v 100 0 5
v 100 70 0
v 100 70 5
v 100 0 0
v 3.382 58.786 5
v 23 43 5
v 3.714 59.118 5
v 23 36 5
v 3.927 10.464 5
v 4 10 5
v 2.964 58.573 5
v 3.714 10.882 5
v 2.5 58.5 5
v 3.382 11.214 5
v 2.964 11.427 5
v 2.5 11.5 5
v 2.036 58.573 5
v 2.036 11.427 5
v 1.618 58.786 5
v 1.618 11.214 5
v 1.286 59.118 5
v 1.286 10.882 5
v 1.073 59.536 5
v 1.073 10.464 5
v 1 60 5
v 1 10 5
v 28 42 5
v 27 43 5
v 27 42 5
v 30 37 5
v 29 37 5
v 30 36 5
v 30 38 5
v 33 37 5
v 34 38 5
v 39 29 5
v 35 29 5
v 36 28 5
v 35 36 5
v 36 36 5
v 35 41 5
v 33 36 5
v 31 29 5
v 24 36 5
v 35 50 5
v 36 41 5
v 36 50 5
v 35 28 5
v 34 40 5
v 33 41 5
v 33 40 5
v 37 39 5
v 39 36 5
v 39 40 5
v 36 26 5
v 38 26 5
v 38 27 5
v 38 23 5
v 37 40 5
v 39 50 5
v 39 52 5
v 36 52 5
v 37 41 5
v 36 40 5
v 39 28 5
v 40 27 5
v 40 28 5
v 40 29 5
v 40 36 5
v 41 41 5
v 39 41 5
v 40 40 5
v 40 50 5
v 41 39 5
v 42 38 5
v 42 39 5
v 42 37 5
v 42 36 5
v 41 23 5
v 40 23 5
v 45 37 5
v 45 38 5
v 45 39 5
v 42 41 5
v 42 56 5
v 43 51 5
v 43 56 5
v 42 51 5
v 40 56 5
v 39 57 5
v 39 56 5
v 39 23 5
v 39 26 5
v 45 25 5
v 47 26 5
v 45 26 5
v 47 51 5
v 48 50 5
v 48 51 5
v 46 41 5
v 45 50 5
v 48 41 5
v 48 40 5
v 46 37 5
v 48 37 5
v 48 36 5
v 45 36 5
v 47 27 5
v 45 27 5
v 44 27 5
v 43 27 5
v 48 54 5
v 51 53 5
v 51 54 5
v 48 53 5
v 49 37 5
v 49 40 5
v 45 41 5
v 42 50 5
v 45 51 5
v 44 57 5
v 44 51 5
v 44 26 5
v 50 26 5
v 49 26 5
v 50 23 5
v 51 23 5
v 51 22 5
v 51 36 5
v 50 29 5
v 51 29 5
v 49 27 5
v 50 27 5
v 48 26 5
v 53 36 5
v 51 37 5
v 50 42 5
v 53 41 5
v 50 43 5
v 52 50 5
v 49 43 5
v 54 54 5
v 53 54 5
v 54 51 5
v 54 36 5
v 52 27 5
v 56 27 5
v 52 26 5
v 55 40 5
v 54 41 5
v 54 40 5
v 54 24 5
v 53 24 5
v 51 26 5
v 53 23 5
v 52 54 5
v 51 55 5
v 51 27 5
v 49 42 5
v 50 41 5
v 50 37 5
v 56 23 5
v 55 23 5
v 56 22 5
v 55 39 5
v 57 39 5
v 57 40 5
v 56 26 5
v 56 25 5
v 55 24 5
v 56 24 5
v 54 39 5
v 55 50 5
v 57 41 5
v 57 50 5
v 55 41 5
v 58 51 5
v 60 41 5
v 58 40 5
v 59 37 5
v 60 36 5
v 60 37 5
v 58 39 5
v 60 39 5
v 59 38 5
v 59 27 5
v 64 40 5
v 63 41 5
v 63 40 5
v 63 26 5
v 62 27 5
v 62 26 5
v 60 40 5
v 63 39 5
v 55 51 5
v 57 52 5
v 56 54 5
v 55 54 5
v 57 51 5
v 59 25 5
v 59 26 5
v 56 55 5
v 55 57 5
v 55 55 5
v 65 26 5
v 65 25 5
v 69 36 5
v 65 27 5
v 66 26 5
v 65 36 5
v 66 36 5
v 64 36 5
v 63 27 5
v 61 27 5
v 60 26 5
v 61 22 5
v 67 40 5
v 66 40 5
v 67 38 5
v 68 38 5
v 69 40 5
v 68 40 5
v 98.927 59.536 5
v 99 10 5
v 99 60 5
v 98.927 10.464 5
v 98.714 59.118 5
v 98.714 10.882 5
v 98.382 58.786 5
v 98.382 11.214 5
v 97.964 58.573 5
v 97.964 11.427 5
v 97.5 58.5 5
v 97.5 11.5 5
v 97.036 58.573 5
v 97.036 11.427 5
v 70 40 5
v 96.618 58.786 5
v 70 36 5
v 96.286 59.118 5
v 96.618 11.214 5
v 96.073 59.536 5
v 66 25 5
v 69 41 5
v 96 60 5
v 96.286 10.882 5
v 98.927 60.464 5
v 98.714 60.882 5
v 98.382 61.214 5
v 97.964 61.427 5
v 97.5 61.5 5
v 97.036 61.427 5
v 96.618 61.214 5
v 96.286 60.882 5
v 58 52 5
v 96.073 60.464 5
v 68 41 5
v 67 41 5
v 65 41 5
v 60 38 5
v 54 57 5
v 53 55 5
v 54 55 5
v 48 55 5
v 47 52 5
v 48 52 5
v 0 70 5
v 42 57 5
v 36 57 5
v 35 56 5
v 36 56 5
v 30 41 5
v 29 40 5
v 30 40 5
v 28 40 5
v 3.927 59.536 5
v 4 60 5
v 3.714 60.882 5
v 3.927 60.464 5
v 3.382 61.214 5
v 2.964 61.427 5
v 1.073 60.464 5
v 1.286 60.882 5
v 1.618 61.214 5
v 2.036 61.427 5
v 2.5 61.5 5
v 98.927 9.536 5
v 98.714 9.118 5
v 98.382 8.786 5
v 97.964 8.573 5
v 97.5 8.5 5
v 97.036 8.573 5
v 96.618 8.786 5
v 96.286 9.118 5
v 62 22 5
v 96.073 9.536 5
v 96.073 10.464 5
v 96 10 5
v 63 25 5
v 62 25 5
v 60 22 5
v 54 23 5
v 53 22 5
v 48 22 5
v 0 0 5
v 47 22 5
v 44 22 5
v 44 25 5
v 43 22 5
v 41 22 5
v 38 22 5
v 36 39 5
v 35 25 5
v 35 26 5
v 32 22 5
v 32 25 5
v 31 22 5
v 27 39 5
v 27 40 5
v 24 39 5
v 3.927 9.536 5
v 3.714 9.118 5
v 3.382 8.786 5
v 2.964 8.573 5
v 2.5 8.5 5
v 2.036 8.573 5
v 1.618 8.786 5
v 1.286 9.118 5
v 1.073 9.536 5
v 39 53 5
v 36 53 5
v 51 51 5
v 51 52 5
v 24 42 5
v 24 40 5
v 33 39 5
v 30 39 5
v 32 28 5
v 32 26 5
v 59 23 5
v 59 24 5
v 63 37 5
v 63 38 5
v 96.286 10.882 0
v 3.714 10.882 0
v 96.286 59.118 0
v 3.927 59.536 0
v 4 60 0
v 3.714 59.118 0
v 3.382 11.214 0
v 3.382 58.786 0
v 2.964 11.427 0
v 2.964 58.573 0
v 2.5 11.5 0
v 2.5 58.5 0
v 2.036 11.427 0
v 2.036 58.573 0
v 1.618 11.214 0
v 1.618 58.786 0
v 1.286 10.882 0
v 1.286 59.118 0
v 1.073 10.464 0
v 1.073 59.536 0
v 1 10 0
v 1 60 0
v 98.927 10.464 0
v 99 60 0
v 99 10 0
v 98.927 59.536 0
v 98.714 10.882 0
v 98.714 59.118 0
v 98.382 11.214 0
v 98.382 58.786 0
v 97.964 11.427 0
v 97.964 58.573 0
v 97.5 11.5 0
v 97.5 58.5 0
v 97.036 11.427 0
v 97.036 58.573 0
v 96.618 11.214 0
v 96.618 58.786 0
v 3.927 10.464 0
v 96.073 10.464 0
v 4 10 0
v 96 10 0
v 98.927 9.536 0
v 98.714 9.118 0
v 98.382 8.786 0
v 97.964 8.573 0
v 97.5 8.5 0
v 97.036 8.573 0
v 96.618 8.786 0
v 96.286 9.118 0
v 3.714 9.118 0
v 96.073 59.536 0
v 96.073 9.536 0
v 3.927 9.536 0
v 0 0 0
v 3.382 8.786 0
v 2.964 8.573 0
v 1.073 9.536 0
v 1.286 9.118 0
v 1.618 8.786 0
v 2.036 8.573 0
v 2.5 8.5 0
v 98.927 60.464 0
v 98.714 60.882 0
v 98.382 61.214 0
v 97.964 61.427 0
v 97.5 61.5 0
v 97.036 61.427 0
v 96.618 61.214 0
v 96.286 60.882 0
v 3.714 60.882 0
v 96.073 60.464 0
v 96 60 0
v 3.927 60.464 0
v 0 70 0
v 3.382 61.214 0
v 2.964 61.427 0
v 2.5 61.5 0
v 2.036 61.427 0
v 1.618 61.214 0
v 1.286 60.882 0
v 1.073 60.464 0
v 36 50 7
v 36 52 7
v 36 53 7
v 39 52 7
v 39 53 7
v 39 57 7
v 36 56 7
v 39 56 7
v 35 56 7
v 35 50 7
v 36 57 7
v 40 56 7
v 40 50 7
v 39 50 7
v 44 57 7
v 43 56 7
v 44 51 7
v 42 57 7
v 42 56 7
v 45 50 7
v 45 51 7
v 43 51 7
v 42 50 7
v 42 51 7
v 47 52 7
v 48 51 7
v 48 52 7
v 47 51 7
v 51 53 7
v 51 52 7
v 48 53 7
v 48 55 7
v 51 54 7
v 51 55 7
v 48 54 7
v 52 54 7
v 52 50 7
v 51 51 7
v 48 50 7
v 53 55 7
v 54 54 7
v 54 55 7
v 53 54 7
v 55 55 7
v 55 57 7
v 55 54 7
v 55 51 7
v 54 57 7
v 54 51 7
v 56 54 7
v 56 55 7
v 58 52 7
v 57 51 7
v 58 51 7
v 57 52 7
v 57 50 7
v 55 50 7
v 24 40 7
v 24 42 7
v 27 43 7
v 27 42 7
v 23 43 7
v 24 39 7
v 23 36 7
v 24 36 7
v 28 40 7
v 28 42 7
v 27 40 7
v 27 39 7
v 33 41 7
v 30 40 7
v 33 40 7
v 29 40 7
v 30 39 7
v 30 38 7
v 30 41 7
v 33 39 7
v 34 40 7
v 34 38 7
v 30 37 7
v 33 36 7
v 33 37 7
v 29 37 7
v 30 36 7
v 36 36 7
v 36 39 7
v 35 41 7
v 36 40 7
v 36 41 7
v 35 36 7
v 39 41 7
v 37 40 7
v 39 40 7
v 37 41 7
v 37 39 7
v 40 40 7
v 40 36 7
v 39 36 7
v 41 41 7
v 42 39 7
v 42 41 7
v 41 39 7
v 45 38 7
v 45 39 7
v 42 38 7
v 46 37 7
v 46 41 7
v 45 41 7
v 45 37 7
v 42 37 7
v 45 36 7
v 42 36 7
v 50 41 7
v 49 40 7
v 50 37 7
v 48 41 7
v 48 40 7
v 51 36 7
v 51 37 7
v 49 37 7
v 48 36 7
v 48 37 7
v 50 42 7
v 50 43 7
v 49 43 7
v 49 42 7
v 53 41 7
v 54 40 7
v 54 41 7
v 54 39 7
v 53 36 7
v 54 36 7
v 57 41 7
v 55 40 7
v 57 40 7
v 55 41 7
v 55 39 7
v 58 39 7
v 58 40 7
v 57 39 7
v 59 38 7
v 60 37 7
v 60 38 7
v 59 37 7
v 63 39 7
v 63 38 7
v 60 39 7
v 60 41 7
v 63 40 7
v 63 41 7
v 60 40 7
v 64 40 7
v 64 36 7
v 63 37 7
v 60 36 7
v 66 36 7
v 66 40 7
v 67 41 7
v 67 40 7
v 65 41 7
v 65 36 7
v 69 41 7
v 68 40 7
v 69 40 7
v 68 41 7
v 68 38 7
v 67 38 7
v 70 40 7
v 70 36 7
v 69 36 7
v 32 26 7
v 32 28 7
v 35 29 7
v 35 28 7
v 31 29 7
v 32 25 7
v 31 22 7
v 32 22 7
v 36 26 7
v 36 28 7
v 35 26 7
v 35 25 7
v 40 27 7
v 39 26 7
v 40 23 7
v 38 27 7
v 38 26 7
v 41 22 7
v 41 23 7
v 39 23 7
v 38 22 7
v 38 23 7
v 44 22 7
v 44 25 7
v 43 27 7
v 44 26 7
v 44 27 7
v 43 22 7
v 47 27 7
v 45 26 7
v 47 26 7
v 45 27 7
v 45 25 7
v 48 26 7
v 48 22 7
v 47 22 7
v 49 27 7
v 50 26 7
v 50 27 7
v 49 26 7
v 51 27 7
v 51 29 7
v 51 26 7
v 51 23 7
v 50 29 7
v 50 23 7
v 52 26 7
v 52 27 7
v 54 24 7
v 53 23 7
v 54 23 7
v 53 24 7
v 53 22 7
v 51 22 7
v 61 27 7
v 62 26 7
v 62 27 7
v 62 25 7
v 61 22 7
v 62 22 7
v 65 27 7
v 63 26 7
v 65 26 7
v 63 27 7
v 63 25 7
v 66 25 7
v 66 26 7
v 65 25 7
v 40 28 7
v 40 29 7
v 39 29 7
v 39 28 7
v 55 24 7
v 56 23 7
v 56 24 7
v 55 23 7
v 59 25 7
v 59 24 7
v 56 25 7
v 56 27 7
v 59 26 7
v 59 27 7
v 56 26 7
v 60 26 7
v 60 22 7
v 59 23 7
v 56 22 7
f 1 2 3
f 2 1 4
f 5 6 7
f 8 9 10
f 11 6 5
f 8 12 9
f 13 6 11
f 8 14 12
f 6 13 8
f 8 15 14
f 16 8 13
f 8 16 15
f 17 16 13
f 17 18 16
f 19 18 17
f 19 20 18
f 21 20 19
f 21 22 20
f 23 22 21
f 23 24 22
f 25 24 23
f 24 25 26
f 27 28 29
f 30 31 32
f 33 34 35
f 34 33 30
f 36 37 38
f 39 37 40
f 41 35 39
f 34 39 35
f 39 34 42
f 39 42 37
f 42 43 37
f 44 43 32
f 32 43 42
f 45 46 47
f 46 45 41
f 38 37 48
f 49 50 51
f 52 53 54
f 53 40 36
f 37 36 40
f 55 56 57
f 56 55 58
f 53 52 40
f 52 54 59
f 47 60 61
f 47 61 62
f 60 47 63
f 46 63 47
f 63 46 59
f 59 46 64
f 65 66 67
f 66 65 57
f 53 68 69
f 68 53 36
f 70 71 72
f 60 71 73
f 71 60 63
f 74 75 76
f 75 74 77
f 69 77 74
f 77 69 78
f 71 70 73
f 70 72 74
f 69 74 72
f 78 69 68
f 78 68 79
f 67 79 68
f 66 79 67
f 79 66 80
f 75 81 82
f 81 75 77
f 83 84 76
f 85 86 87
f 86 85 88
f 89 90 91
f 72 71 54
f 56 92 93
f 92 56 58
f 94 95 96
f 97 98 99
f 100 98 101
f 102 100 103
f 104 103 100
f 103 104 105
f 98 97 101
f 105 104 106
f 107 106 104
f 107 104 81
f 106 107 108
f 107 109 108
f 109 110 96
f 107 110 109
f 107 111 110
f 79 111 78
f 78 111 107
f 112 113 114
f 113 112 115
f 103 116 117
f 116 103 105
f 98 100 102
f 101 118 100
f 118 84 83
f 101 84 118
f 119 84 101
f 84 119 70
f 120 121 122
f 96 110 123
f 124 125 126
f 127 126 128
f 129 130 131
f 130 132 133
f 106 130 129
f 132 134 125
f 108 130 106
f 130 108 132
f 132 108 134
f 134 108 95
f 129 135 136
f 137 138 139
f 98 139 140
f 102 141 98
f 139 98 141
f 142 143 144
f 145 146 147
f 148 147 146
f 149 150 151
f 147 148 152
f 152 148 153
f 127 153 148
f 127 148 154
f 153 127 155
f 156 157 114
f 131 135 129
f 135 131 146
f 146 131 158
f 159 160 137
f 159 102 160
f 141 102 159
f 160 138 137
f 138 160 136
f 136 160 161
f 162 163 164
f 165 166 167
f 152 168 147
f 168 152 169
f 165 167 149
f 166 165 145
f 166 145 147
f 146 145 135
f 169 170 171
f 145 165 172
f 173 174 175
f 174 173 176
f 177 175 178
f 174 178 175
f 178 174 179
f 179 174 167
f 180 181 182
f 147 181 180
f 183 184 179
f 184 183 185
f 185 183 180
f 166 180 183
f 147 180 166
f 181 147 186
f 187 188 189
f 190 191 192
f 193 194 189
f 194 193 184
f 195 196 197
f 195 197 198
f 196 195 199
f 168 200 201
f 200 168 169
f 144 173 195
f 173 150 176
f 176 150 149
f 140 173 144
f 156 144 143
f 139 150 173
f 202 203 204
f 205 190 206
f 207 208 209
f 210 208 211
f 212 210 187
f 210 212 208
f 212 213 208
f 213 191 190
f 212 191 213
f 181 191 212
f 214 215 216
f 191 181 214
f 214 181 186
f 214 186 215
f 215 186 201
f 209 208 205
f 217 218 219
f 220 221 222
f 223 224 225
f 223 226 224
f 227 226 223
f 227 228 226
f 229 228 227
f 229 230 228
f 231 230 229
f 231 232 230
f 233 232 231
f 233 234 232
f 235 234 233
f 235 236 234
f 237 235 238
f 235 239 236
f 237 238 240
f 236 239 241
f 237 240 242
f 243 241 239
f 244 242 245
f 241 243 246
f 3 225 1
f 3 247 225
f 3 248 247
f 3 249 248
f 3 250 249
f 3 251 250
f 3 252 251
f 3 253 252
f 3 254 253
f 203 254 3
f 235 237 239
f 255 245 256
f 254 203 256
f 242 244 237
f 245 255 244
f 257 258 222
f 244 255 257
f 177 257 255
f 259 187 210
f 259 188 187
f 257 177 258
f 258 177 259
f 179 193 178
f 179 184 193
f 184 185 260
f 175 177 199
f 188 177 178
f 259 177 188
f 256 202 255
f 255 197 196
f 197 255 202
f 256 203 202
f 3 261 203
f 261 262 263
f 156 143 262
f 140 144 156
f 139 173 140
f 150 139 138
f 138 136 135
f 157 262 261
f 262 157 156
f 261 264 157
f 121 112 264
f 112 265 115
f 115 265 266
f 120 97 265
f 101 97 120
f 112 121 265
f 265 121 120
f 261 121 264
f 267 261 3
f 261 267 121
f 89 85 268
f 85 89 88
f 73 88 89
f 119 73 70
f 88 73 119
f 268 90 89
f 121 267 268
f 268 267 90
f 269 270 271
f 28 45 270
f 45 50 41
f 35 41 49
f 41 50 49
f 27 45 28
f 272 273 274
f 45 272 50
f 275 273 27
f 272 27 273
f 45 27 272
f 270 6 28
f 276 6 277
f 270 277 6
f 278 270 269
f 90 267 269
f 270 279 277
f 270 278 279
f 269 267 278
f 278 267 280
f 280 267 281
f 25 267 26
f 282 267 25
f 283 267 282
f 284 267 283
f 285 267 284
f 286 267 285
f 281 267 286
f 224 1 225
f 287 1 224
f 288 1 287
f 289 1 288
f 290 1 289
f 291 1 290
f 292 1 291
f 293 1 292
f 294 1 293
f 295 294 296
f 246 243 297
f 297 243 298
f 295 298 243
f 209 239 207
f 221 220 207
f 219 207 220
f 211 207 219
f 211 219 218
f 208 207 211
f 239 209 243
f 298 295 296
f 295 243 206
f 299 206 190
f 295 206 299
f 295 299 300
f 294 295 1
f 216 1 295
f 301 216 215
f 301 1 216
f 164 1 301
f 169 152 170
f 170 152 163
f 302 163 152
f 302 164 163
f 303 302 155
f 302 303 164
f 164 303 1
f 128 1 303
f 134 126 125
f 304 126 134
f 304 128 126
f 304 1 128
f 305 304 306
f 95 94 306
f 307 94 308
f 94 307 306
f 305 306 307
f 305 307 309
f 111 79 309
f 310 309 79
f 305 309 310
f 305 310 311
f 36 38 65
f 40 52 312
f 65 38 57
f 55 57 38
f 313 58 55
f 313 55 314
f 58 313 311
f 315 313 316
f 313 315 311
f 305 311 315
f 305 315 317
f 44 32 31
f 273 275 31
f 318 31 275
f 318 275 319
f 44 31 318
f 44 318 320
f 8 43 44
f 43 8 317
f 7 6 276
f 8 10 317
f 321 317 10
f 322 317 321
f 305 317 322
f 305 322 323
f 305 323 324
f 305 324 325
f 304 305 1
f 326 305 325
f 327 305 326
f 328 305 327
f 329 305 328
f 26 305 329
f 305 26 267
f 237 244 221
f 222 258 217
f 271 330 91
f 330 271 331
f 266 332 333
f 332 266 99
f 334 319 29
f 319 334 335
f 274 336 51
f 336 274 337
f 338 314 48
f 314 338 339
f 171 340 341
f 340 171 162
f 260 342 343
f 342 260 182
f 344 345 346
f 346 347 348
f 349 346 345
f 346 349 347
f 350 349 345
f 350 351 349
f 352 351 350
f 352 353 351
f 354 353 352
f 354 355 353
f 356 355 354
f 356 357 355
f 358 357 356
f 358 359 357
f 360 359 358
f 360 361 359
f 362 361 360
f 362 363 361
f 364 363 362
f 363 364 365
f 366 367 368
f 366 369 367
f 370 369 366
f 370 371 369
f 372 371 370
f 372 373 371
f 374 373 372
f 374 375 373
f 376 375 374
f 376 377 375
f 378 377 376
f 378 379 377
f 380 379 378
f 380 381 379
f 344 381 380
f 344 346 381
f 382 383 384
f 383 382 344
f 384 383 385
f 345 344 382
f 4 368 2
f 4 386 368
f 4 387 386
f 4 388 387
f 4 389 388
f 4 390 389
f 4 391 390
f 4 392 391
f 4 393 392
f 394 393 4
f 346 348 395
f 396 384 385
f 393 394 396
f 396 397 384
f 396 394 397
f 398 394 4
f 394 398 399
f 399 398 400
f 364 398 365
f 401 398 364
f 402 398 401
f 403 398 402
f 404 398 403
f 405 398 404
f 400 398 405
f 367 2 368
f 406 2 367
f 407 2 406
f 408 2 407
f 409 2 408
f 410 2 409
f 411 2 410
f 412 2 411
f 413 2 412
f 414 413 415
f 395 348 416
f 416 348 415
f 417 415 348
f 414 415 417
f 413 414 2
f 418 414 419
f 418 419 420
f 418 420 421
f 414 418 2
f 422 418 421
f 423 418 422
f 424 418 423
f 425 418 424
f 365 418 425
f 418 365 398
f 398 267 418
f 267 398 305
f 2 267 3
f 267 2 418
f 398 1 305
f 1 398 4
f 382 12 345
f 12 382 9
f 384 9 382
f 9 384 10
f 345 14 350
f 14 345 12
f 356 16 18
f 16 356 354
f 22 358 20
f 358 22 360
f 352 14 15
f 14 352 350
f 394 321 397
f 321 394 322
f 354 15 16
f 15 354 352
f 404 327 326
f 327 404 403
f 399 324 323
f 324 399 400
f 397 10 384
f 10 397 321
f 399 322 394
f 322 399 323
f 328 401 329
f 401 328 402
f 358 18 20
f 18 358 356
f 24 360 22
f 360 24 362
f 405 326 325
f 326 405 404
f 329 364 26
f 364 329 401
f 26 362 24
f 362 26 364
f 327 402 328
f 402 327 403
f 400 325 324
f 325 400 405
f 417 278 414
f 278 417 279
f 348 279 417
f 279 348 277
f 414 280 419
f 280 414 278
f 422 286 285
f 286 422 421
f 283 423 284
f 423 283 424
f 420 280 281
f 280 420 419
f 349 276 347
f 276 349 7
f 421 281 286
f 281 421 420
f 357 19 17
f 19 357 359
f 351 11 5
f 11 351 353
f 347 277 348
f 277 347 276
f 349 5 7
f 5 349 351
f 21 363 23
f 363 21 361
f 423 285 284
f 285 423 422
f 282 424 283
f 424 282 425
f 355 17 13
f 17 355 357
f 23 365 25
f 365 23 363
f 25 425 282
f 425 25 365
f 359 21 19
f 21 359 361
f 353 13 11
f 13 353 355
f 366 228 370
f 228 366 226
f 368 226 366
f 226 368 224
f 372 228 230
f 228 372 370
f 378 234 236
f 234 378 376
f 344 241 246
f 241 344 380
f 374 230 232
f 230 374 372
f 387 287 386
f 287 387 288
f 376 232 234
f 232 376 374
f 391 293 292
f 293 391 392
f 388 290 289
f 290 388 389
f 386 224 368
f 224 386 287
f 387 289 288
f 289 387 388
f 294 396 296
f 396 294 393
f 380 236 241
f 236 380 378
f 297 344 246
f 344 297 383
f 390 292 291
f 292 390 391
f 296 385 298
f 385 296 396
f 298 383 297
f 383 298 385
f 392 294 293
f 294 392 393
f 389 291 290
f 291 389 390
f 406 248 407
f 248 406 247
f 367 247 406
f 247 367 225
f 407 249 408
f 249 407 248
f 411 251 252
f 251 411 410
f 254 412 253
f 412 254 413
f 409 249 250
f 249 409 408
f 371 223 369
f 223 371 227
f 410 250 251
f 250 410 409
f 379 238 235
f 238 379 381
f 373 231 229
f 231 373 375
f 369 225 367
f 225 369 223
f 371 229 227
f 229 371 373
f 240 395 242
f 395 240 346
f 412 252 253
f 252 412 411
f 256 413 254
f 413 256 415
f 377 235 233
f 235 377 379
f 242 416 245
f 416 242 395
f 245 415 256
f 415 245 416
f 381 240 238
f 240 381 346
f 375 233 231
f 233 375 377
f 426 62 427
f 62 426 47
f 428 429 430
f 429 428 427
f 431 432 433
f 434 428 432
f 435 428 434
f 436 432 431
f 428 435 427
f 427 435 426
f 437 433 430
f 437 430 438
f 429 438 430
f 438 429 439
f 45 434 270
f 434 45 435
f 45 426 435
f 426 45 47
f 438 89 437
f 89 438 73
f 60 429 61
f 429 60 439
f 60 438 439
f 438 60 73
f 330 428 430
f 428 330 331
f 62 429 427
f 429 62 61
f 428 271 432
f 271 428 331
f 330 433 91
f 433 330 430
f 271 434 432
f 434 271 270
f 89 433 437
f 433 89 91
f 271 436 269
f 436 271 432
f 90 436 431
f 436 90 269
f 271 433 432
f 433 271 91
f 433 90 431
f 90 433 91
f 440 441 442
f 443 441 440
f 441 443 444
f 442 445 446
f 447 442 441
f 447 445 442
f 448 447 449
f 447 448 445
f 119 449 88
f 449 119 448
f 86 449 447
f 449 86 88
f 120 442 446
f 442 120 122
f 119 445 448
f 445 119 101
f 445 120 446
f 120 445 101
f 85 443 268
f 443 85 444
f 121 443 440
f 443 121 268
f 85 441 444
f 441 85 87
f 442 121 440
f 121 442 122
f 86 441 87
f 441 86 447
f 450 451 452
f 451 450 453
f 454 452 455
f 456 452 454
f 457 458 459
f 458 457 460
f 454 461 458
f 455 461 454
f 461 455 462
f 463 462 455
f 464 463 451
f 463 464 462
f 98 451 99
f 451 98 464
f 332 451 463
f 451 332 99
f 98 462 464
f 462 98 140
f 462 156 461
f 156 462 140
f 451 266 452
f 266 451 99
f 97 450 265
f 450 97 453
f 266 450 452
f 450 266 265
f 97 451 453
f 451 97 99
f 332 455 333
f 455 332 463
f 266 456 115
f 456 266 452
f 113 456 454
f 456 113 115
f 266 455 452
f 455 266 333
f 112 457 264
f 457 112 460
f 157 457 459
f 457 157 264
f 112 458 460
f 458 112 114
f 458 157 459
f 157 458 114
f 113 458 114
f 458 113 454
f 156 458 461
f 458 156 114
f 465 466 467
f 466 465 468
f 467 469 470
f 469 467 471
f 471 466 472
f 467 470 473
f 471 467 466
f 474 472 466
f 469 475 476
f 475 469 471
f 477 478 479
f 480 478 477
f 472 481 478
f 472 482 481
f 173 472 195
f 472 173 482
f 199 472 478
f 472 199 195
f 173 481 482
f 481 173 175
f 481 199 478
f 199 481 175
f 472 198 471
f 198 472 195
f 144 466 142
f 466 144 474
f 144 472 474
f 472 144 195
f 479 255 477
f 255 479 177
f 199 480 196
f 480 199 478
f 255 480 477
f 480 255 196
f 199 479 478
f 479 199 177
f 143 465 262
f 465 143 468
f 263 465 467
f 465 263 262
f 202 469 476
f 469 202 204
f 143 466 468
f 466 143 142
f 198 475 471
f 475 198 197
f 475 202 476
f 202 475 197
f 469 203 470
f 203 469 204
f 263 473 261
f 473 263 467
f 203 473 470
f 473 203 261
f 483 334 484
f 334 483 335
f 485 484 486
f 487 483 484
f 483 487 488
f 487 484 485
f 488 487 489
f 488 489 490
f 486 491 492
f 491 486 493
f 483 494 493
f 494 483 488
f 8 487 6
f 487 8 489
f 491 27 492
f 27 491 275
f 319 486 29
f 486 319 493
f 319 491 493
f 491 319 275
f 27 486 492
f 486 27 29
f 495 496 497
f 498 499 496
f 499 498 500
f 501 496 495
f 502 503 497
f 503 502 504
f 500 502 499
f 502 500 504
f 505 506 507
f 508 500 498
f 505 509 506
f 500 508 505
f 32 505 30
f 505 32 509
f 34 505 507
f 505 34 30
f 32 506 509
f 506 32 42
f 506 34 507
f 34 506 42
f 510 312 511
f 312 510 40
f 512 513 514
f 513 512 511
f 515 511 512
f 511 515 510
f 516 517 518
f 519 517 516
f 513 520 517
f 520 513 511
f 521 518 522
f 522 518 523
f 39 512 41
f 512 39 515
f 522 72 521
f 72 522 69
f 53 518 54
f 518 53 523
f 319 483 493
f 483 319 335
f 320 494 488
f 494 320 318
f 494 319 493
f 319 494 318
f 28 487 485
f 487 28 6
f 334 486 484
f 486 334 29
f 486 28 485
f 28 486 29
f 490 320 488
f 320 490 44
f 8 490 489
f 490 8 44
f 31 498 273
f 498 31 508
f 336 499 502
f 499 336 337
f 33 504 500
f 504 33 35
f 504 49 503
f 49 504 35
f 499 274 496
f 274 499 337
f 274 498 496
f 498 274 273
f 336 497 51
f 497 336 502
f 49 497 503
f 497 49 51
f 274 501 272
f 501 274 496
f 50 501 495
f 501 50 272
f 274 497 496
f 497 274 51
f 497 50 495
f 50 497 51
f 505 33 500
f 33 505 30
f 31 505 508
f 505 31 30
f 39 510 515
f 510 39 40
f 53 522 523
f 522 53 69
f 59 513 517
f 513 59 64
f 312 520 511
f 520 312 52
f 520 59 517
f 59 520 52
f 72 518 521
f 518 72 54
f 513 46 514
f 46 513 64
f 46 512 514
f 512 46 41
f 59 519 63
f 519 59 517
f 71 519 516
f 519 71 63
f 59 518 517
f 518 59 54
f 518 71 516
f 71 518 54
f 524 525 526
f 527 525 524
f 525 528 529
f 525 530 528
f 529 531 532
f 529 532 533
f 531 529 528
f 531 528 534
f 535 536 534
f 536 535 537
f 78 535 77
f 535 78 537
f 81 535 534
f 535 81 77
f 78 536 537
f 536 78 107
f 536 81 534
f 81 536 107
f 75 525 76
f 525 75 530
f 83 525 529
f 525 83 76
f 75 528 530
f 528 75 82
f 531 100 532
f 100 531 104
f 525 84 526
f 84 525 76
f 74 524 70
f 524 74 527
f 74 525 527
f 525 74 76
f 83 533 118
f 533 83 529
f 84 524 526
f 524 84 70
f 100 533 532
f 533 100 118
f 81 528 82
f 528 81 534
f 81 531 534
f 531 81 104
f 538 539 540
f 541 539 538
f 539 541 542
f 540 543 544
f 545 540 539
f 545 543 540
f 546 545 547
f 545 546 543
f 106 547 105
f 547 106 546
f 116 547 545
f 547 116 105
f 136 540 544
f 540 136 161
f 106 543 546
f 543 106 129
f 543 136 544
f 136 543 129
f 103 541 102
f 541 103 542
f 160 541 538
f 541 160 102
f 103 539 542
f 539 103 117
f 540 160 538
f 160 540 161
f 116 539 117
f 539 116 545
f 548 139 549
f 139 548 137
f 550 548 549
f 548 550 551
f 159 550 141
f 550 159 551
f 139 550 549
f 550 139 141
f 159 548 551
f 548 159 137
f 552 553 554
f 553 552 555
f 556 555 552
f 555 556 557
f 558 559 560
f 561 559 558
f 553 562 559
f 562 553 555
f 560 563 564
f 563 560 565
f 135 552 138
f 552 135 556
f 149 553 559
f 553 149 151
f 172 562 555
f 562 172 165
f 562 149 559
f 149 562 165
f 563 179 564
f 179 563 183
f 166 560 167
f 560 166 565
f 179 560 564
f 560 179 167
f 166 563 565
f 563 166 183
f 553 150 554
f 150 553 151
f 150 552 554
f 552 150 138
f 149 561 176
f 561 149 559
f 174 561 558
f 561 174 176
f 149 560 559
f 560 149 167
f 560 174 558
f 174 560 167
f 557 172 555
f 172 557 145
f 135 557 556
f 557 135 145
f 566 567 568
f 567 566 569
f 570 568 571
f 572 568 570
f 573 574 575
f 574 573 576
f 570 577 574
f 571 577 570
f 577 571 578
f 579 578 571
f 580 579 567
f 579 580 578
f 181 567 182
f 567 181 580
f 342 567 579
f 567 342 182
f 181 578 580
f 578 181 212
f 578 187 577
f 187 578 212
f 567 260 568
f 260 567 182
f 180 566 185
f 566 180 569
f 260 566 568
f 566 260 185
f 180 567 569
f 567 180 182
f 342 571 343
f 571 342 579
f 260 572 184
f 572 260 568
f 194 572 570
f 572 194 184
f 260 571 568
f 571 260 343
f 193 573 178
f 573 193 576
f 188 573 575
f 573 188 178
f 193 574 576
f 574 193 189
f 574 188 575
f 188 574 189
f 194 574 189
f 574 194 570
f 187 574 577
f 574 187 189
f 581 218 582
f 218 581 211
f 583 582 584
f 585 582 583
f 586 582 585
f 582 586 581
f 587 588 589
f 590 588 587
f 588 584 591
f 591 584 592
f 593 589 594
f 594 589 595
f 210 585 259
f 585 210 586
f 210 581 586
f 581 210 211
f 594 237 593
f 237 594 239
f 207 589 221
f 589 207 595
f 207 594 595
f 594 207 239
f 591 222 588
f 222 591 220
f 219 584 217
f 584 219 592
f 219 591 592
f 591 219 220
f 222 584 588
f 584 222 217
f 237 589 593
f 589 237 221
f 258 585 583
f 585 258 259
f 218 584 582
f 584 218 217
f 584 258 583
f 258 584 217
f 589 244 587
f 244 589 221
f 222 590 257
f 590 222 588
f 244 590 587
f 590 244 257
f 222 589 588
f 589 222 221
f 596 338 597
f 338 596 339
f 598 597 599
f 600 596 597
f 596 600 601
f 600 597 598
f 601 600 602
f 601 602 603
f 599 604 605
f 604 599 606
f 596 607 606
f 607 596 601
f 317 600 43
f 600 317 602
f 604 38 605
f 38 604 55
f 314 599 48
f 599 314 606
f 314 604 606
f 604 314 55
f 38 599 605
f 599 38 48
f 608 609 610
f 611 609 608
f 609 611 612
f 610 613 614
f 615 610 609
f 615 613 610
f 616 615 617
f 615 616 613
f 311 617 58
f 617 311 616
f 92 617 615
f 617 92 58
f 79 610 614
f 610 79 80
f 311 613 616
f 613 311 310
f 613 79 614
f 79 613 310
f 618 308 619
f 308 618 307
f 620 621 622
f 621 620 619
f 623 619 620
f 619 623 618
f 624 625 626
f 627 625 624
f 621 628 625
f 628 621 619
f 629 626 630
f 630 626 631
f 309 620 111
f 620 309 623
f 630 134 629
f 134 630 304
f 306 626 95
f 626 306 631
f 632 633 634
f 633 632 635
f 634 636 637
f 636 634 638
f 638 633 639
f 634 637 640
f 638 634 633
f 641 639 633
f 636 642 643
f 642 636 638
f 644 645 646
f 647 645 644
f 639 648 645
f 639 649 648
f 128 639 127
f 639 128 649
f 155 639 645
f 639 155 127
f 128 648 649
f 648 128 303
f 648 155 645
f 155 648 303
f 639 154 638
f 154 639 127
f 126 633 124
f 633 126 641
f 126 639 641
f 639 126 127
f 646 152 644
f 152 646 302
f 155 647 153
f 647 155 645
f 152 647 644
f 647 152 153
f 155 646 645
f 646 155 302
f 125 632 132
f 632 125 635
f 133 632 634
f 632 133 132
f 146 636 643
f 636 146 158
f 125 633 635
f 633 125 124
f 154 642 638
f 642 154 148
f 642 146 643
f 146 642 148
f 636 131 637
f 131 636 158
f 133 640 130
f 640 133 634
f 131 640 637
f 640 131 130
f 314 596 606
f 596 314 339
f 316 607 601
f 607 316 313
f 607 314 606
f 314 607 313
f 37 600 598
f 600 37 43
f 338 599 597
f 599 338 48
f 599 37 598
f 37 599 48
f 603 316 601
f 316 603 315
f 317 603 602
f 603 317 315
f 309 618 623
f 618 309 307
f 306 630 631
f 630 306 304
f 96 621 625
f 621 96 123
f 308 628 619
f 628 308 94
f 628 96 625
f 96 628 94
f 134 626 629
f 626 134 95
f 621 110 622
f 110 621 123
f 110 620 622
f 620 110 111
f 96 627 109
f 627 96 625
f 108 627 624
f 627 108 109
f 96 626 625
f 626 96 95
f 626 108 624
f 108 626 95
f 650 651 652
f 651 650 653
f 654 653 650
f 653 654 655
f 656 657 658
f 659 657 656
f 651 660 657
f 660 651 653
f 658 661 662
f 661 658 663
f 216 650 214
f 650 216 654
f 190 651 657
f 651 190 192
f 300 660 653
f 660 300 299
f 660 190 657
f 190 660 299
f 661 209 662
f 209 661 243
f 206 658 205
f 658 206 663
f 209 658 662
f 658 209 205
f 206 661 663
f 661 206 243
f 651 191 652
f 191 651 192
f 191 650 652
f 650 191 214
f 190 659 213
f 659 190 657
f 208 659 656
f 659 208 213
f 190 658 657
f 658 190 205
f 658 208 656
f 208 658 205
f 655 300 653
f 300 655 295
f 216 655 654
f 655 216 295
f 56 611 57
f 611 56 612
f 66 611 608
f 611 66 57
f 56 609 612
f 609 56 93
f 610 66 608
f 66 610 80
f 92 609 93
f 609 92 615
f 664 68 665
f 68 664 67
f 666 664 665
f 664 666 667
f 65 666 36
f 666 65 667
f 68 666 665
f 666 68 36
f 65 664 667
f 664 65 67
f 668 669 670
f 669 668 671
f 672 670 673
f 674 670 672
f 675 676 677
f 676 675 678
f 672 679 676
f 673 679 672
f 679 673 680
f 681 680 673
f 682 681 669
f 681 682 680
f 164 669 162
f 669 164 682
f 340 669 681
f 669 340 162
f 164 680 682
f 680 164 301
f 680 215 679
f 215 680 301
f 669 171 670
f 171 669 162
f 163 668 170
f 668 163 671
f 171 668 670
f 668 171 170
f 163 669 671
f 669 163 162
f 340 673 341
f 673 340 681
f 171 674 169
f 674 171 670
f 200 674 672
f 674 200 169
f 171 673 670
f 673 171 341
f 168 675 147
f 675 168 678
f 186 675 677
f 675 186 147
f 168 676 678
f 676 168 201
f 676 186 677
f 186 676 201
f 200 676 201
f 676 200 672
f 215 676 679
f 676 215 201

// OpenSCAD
difference(){
cube ([100,70,5]);
//screw1
translate([2.5,10,-0.5])
cylinder (h=6,d=3,$fn=20);
//screw2
translate([2.5,60,-0.5])
cylinder (h=6,d=3,$fn=20);
//screw3
translate([97.5,10,-0.5])
cylinder (h=6,d=3,$fn=20);
//screw4
translate([97.5,60,-0.5])
cylinder (h=6,d=3,$fn=20);
}
translate([35,50,3])
scale([1,1,4])
drawtext("Alat"); 
translate([23,36,3])
scale([1,1,4])
drawtext("Penyiram");
translate([31,22,3])
scale([1,1,4])
drawtext("Pintar");
//Draw text
drawtext("Hello World!");

//Draw character set
//scale([2,2,2]) drawtext(" !\"#$%&'()*+,-./0123456789:;<=>?@ABCDEFGHIJKLMNOPQRSTUVWXYZ[\\]^_`abcdefghijklmnopqrstuvwxyz{|}");

module drawtext(text) {
	//Characters
	chars = " !\"#$%&'()*+,-./0123456789:;<=>?@ABCDEFGHIJKLMNOPQRSTUVWXYZ[\\]^_`abcdefghijklmnopqrstuvwxyz{|}";

	//Chracter table defining 5x7 characters
	//Adapted from: http://www.geocities.com/dinceraydin/djlcdsim/chartable.js
	char_table = [ [ 0, 0, 0, 0, 0, 0, 0],
                  [ 4, 0, 4, 4, 4, 4, 4],
                  [ 0, 0, 0, 0,10,10,10],
                  [10,10,31,10,31,10,10],
                  [ 4,30, 5,14,20,15, 4],
                  [ 3,19, 8, 4, 2,25,24],
                  [13,18,21, 8,20,18,12],
                  [ 0, 0, 0, 0, 8, 4,12],
                  [ 2, 4, 8, 8, 8, 4, 2],
                  [ 8, 4, 2, 2, 2, 4, 8],
                  [ 0, 4,21,14,21, 4, 0],
                  [ 0, 4, 4,31, 4, 4, 0],
                  [ 8, 4,12, 0, 0, 0, 0],
                  [ 0, 0, 0,31, 0, 0, 0],
                  [12,12, 0, 0, 0, 0, 0],
                  [ 0,16, 8, 4, 2, 1, 0],
                  [14,17,25,21,19,17,14],
                  [14, 4, 4, 4, 4,12, 4],
                  [31, 8, 4, 2, 1,17,14],
                  [14,17, 1, 2, 4, 2,31],
                  [ 2, 2,31,18,10, 6, 2],
                  [14,17, 1, 1,30,16,31],
                  [14,17,17,30,16, 8, 6],
                  [ 8, 8, 8, 4, 2, 1,31],
                  [14,17,17,14,17,17,14],
                  [12, 2, 1,15,17,17,14],
                  [ 0,12,12, 0,12,12, 0],
                  [ 8, 4,12, 0,12,12, 0],
                  [ 2, 4, 8,16, 8, 4, 2],
                  [ 0, 0,31, 0,31, 0, 0],
                  [16, 8, 4, 2, 4, 8,16],
                  [ 4, 0, 4, 2, 1,17,14],
                  [14,21,21,13, 1,17,14],
                  [17,17,31,17,17,17,14],
                  [30,17,17,30,17,17,30],
                  [14,17,16,16,16,17,14],
                  [30,17,17,17,17,17,30],
                  [31,16,16,30,16,16,31],
                  [16,16,16,30,16,16,31],
                  [15,17,17,23,16,17,14],
                  [17,17,17,31,17,17,17],
                  [14, 4, 4, 4, 4, 4,14],
                  [12,18, 2, 2, 2, 2, 7],
                  [17,18,20,24,20,18,17],
                  [31,16,16,16,16,16,16],
                  [17,17,17,21,21,27,17],
                  [17,17,19,21,25,17,17],
                  [14,17,17,17,17,17,14],
                  [16,16,16,30,17,17,30],
                  [13,18,21,17,17,17,14],
                  [17,18,20,30,17,17,30],
                  [30, 1, 1,14,16,16,15],
                  [ 4, 4, 4, 4, 4, 4,31],
                  [14,17,17,17,17,17,17],
                  [ 4,10,17,17,17,17,17],
                  [10,21,21,21,17,17,17],
                  [17,17,10, 4,10,17,17],
                  [ 4, 4, 4,10,17,17,17],
                  [31,16, 8, 4, 2, 1,31],
                  [14, 8, 8, 8, 8, 8,14],
                  [ 0, 1, 2, 4, 8,16, 0],
                  [14, 2, 2, 2, 2, 2,14],
                  [ 0, 0, 0, 0,17,10, 4],
                  [31, 0, 0, 0, 0, 0, 0],
                  [ 0, 0, 0, 0, 2, 4, 8],
                  [15,17,15, 1,14, 0, 0],
                  [30,17,17,25,22,16,16],
                  [14,17,16,16,14, 0, 0],
                  [15,17,17,19,13, 1, 1],
                  [14,16,31,17,14, 0, 0],
                  [ 8, 8, 8,28, 8, 9, 6],
                  [14, 1,15,17,15, 0, 0],
                  [17,17,17,25,22,16,16],
                  [14, 4, 4, 4,12, 0, 4],
                  [12,18, 2, 2, 2, 6, 2],
                  [18,20,24,20,18,16,16],
                  [14, 4, 4, 4, 4, 4,12],
                  [17,17,21,21,26, 0, 0],
                  [17,17,17,25,22, 0, 0],
                  [14,17,17,17,14, 0, 0],
                  [16,16,30,17,30, 0, 0],
                  [ 1, 1,15,19,13, 0, 0],
                  [16,16,16,25,22, 0, 0],
                  [30, 1,14,16,15, 0, 0],
                  [ 6, 9, 8, 8,28, 8, 8],
                  [13,19,17,17,17, 0, 0],
                  [ 4,10,17,17,17, 0, 0],
                  [10,21,21,17,17, 0, 0],
                  [17,10, 4,10,17, 0, 0],
                  [14, 1,15,17,17, 0, 0],
                  [31, 8, 4, 2,31, 0, 0],
                  [ 2, 4, 4, 8, 4, 4, 2],
                  [ 4, 4, 4, 4, 4, 4, 4],
                  [ 8, 4, 4, 2, 4, 4, 8] ];

	//Binary decode table
	dec_table = [ "00000", "00001", "00010", "00011", "00100", "00101",
  	            "00110", "00111", "01000", "01001", "01010", "01011",
  	            "01100", "01101", "01110", "01111", "10000", "10001",
  	            "10010", "10011", "10100", "10101", "10110", "10111",
	            "11000", "11001", "11010", "11011", "11100", "11101",
	            "11110", "11111" ];

	//Process string one character at a time
	for(itext = [0:len(text)-1]) {
		//Convert character to index
		assign(ichar = search(text[itext],chars,1)[0]) {
			//Decode character - rows
			for(irow = [0:6]) {
				assign(val = dec_table[char_table[ichar][irow]]) {
					//Decode character - cols
					for(icol = [0:4]) {
						assign(bit = search(val[icol],"01",1)[0]) {
							if(bit) {
								//Output cube
								translate([icol + (6*itext), irow, 0])
									cube([1.0001,1.0001,1]);
							}
						}
					}
				}
			}
		}
	}
}
